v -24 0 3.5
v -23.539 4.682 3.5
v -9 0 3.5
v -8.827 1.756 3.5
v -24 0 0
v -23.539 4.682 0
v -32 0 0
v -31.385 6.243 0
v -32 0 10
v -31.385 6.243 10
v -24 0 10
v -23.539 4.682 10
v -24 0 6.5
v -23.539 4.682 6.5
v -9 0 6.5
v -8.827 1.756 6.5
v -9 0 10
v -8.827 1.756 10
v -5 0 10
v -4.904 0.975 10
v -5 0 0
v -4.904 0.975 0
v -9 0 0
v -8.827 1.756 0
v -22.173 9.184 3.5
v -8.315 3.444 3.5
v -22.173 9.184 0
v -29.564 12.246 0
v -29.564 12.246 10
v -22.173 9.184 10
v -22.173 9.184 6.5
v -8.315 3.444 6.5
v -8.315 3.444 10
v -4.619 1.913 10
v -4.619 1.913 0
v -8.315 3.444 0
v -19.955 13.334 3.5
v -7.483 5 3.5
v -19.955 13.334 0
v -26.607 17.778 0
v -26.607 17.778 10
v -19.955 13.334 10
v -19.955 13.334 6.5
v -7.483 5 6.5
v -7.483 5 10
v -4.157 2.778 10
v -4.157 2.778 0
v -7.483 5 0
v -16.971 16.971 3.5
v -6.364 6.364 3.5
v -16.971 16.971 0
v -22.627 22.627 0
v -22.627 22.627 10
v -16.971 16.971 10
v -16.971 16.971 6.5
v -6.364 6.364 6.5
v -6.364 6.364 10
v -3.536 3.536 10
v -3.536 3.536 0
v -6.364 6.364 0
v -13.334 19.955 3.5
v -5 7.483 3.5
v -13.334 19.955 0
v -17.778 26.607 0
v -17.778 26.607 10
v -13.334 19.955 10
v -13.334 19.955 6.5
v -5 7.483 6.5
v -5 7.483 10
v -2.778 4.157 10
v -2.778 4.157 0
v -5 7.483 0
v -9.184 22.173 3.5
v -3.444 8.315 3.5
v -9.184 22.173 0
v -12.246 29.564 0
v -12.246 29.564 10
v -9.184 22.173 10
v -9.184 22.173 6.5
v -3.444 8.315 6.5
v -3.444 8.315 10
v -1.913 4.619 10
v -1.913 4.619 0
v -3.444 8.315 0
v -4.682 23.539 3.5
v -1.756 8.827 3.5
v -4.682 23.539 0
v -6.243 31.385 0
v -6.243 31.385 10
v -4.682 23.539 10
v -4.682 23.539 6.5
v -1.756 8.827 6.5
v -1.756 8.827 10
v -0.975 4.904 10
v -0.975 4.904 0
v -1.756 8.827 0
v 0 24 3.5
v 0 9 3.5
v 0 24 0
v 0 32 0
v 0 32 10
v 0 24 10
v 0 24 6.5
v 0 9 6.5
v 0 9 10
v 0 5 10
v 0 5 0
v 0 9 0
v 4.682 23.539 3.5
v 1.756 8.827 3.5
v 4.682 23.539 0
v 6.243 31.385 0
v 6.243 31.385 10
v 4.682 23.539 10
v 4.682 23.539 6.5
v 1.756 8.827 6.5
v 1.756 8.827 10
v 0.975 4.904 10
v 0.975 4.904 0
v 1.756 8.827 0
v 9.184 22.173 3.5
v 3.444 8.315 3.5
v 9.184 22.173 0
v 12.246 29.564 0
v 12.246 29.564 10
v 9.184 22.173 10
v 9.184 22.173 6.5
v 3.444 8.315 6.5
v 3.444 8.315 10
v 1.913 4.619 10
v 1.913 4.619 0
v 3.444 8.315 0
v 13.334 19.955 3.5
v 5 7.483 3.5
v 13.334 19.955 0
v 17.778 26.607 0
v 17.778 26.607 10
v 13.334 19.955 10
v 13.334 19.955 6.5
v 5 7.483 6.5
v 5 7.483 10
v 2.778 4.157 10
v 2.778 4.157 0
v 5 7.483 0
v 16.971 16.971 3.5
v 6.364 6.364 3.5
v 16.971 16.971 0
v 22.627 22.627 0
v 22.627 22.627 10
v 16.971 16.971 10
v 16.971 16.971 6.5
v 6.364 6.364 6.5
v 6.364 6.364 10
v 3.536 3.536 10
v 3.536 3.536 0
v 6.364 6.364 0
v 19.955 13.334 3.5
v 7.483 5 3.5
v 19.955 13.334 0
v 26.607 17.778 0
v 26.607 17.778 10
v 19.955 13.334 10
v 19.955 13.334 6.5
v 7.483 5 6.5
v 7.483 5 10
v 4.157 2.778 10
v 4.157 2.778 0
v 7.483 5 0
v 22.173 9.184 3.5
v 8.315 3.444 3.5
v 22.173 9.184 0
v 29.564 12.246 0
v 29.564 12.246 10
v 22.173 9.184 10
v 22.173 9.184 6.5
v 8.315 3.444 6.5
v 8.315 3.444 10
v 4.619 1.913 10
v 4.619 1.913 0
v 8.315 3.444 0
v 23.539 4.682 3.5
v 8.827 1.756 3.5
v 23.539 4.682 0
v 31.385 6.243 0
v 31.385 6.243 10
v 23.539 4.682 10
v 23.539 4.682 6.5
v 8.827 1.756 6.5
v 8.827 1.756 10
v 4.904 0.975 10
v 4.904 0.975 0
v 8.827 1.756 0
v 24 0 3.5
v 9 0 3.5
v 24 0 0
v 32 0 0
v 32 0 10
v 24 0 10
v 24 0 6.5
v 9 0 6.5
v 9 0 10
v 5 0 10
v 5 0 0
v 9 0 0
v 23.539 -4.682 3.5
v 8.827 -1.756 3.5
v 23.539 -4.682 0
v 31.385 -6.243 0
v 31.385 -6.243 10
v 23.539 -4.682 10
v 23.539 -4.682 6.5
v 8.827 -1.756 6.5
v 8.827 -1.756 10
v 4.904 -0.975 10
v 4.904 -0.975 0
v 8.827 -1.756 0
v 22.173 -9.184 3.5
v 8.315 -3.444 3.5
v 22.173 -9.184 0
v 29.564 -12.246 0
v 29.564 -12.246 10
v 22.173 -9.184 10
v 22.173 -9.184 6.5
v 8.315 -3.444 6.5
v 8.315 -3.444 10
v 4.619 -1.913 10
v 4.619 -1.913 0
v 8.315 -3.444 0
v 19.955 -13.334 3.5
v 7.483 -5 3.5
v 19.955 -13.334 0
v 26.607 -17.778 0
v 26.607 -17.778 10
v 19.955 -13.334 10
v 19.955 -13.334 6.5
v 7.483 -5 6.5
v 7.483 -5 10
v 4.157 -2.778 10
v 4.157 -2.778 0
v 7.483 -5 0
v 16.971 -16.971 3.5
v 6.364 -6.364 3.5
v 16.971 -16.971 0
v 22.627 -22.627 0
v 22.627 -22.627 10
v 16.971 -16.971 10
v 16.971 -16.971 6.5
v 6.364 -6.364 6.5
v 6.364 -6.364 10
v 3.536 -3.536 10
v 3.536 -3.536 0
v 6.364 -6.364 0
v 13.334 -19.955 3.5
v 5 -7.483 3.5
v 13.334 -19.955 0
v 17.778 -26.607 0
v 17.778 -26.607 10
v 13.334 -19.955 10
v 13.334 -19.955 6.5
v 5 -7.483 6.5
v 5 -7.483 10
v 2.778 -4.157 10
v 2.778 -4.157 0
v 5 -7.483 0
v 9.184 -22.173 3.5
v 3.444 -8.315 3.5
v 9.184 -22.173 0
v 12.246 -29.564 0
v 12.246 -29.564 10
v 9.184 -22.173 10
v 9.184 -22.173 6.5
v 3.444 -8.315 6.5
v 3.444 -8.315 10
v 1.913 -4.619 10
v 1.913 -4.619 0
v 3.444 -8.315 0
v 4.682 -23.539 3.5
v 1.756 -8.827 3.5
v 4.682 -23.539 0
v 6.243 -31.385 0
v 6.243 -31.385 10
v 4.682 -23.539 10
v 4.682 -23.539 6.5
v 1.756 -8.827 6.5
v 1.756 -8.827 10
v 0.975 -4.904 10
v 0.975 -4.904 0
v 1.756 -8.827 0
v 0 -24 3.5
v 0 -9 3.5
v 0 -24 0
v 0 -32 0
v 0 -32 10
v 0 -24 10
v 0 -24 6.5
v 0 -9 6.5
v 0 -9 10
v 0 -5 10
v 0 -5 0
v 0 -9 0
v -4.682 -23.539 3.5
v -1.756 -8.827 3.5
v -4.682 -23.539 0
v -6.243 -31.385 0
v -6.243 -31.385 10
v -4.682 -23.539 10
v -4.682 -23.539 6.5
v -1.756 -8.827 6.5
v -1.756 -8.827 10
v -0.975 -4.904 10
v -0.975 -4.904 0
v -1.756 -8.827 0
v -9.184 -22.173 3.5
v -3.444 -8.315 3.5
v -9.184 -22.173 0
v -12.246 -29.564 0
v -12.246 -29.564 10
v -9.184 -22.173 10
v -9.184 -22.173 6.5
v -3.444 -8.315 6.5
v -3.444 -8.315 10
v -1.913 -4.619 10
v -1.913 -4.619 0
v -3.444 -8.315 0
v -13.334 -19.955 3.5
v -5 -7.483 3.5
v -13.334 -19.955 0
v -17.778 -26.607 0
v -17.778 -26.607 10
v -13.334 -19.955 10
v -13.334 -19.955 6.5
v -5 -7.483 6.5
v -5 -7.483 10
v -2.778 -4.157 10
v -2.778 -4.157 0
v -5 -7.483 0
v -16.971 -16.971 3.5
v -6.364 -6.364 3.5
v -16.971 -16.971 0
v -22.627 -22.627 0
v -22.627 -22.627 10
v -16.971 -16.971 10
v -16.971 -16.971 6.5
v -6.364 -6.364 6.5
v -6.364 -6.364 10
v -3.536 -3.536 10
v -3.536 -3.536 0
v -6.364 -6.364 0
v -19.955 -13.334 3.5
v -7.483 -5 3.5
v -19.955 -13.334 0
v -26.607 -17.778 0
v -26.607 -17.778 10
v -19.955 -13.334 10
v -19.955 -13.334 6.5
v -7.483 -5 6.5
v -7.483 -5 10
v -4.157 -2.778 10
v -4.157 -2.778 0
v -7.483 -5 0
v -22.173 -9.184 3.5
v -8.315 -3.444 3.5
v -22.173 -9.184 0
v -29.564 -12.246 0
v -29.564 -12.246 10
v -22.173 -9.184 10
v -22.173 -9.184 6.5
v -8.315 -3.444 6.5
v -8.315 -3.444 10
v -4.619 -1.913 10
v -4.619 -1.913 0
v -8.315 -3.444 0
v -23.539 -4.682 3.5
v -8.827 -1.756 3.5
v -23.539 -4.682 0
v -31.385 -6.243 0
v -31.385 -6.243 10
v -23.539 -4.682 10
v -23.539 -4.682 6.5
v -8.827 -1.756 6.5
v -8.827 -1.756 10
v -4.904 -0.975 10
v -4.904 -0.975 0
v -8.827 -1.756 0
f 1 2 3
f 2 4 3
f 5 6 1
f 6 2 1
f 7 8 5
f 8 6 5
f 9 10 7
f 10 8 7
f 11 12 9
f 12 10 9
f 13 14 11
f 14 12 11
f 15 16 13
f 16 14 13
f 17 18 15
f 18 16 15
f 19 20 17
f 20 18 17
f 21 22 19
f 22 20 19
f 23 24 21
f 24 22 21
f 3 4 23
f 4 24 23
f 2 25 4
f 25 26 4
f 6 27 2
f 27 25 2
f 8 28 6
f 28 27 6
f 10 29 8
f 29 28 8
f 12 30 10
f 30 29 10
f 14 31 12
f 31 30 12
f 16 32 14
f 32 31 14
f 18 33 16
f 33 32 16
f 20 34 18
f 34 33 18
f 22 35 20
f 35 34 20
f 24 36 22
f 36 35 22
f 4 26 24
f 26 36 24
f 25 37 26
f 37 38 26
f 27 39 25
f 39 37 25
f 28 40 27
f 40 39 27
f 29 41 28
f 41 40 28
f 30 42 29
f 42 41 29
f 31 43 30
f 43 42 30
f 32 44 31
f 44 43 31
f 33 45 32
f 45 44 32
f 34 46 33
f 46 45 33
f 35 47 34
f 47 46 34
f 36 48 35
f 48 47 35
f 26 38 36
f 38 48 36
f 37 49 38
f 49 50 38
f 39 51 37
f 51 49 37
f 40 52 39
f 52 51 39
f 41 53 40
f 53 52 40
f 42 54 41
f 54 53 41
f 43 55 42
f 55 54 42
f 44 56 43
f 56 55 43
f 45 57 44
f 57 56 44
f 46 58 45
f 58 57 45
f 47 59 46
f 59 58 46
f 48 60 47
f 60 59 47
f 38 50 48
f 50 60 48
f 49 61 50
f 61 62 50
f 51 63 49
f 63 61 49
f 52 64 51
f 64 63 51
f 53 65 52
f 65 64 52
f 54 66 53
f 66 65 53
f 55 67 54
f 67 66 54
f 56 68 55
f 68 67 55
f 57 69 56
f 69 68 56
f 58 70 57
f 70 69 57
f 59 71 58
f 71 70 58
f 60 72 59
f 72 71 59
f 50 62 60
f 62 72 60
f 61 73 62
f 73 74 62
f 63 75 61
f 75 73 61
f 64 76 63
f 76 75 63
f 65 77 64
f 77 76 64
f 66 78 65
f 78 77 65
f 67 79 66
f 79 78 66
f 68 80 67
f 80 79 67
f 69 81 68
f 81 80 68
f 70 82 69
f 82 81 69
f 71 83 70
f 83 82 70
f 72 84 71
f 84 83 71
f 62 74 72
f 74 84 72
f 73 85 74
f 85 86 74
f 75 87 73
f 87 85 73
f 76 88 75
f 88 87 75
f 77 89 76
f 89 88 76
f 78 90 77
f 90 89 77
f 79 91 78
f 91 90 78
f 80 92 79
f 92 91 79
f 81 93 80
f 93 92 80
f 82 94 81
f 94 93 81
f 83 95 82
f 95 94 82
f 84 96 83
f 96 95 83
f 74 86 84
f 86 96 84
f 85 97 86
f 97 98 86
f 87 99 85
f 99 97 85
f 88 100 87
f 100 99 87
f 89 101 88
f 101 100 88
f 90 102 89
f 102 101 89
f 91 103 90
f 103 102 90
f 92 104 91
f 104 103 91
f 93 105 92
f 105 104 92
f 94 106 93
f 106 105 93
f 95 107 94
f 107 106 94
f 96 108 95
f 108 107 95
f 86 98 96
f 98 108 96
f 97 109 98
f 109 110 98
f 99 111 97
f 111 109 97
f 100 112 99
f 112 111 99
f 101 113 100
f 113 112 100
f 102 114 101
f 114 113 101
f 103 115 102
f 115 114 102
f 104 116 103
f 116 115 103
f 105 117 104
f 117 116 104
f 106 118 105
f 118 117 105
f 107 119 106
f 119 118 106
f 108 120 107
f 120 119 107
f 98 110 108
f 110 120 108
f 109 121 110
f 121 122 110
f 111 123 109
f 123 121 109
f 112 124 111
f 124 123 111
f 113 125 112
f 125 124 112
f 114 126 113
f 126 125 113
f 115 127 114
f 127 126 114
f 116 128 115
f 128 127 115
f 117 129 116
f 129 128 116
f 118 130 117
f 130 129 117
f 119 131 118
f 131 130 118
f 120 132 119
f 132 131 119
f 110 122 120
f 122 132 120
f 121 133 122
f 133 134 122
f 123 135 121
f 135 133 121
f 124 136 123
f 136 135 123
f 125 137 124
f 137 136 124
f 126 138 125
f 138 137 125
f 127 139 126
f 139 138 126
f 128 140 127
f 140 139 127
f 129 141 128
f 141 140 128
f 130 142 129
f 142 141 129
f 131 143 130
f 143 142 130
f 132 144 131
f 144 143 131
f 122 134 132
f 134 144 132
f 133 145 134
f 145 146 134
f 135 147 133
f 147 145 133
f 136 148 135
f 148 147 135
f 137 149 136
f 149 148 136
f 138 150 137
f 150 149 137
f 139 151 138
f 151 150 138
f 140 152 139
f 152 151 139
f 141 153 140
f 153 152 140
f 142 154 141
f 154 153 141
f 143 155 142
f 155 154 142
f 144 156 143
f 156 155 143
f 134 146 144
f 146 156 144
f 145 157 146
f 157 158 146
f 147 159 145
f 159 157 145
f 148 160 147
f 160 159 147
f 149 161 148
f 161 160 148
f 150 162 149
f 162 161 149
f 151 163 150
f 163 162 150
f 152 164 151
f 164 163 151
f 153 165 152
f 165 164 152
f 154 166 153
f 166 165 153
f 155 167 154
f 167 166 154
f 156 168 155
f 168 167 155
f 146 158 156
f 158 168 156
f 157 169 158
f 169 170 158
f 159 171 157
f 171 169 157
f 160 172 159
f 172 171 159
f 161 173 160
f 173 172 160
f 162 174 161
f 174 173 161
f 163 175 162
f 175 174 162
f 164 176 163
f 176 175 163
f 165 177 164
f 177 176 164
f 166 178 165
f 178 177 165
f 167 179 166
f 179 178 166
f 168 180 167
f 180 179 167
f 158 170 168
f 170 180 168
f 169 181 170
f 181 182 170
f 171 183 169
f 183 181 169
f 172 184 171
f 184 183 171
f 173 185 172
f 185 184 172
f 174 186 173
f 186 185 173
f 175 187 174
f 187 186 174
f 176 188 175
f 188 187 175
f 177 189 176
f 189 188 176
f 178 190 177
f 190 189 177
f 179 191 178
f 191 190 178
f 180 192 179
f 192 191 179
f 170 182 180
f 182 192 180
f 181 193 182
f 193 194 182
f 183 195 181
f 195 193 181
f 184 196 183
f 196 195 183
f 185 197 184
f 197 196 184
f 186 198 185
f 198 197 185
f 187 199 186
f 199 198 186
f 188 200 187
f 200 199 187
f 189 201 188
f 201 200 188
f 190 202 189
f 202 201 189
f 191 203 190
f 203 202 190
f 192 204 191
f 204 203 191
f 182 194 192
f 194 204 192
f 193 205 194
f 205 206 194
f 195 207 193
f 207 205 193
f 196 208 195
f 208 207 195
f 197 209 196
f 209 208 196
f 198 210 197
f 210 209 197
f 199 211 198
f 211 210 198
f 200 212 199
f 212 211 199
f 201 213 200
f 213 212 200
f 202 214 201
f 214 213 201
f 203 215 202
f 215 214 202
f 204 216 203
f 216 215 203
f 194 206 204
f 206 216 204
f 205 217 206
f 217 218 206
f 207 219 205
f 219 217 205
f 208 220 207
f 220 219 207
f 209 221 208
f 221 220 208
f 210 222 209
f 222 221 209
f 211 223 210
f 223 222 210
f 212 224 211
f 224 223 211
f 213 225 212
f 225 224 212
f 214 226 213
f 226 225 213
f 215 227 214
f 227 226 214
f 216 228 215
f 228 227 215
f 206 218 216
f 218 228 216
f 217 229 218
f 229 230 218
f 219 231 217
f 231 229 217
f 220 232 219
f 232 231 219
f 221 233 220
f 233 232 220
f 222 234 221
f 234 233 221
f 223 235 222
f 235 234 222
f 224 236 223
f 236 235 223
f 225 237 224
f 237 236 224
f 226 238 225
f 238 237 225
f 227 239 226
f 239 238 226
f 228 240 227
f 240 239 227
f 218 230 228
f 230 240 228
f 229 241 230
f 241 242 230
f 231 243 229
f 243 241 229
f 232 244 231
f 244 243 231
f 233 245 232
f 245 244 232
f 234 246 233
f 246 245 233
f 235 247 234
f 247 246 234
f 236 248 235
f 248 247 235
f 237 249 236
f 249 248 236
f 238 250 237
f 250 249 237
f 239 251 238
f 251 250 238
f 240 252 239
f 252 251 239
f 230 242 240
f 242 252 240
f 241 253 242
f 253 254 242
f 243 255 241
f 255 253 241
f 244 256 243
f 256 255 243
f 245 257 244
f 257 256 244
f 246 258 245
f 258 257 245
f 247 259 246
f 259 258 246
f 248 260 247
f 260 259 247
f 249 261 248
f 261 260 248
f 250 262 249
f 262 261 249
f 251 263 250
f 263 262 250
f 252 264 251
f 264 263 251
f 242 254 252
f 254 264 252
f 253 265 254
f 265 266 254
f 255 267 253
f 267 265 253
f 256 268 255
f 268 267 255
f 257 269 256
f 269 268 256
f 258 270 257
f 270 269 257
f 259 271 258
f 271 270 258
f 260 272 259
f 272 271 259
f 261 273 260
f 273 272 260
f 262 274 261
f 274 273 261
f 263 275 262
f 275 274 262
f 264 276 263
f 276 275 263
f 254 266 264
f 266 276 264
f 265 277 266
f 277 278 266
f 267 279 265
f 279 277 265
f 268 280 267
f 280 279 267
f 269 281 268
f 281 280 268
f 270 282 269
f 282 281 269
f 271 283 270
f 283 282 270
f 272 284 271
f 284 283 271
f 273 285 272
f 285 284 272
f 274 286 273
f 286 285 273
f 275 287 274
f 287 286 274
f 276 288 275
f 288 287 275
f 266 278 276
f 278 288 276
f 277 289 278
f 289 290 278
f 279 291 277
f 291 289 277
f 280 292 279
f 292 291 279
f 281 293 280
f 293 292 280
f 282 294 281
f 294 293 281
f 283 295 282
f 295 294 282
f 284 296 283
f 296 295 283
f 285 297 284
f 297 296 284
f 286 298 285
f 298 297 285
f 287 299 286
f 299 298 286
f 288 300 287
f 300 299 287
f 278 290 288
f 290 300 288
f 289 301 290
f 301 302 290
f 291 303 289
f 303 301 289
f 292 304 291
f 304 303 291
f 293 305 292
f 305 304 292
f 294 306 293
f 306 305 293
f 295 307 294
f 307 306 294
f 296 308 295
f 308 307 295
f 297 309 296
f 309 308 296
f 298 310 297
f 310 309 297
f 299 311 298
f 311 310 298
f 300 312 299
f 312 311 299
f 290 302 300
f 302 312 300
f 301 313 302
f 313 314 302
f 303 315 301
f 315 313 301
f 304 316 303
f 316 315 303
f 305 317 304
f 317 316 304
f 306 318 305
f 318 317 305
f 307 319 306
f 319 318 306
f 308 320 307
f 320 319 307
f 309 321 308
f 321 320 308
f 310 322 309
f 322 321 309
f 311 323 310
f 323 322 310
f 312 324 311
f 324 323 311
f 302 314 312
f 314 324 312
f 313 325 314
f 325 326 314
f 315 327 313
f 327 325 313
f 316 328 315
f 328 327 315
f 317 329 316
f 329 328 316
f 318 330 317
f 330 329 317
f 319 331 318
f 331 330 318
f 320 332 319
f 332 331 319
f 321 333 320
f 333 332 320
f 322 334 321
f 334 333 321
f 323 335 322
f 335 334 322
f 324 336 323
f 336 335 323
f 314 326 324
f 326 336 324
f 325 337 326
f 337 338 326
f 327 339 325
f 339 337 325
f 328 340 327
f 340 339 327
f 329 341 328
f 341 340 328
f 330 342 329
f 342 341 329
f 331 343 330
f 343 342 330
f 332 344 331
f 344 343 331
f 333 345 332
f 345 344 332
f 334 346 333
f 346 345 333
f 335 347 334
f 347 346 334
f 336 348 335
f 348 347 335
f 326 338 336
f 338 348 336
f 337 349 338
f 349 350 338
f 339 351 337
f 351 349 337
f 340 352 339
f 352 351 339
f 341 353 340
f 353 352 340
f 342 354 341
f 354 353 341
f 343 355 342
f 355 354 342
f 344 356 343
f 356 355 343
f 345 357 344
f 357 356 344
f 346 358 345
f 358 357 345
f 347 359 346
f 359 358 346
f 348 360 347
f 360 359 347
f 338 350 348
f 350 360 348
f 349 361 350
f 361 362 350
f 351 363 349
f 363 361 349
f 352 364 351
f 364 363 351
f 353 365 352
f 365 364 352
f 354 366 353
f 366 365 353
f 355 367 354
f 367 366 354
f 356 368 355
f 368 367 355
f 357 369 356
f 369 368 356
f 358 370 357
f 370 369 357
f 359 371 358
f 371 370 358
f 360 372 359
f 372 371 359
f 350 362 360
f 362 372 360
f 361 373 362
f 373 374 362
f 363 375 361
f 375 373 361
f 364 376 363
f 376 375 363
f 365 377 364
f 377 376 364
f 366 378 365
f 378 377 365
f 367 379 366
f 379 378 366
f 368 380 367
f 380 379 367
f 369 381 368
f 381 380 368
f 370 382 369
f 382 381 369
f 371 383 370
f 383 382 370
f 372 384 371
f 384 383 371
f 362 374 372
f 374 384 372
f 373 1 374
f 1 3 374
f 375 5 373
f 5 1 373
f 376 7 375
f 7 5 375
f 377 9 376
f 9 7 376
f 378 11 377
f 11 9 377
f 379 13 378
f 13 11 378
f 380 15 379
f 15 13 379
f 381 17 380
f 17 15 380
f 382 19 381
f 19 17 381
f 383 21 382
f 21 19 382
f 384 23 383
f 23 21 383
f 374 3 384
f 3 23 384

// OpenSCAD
$fn = 32;

// ----------------------------------------------------------------------
// Revolved part: handwheel R32
// ----------------------------------------------------------------------

// --- parameters (mm) ---
bore_r = 5;               // bore radius
rim_r = 32;               // rim radius
rim_w = 8;                // rim axial width
rim_t = 10;               // rim diameter height
hub_r = 9;                // hub radius
web_t = 3;                // web thickness
revolve_angle = 360;      // revolve sweep, degrees

bore_d = 2 * bore_r;
rim_d = 2 * rim_r;
hub_d = 2 * hub_r;

profile = [[5, 0], [9, 0], [9, 3.5], [24, 3.5], [24, 0], [32, 0], [32, 10], [24, 10], [24, 6.5], [9, 6.5], [9, 10], [5, 10]];  // primary outline, 12 points, counter clockwise

// --- the one profile operation ---
rotate_extrude(angle = revolve_angle) polygon(points = profile);
